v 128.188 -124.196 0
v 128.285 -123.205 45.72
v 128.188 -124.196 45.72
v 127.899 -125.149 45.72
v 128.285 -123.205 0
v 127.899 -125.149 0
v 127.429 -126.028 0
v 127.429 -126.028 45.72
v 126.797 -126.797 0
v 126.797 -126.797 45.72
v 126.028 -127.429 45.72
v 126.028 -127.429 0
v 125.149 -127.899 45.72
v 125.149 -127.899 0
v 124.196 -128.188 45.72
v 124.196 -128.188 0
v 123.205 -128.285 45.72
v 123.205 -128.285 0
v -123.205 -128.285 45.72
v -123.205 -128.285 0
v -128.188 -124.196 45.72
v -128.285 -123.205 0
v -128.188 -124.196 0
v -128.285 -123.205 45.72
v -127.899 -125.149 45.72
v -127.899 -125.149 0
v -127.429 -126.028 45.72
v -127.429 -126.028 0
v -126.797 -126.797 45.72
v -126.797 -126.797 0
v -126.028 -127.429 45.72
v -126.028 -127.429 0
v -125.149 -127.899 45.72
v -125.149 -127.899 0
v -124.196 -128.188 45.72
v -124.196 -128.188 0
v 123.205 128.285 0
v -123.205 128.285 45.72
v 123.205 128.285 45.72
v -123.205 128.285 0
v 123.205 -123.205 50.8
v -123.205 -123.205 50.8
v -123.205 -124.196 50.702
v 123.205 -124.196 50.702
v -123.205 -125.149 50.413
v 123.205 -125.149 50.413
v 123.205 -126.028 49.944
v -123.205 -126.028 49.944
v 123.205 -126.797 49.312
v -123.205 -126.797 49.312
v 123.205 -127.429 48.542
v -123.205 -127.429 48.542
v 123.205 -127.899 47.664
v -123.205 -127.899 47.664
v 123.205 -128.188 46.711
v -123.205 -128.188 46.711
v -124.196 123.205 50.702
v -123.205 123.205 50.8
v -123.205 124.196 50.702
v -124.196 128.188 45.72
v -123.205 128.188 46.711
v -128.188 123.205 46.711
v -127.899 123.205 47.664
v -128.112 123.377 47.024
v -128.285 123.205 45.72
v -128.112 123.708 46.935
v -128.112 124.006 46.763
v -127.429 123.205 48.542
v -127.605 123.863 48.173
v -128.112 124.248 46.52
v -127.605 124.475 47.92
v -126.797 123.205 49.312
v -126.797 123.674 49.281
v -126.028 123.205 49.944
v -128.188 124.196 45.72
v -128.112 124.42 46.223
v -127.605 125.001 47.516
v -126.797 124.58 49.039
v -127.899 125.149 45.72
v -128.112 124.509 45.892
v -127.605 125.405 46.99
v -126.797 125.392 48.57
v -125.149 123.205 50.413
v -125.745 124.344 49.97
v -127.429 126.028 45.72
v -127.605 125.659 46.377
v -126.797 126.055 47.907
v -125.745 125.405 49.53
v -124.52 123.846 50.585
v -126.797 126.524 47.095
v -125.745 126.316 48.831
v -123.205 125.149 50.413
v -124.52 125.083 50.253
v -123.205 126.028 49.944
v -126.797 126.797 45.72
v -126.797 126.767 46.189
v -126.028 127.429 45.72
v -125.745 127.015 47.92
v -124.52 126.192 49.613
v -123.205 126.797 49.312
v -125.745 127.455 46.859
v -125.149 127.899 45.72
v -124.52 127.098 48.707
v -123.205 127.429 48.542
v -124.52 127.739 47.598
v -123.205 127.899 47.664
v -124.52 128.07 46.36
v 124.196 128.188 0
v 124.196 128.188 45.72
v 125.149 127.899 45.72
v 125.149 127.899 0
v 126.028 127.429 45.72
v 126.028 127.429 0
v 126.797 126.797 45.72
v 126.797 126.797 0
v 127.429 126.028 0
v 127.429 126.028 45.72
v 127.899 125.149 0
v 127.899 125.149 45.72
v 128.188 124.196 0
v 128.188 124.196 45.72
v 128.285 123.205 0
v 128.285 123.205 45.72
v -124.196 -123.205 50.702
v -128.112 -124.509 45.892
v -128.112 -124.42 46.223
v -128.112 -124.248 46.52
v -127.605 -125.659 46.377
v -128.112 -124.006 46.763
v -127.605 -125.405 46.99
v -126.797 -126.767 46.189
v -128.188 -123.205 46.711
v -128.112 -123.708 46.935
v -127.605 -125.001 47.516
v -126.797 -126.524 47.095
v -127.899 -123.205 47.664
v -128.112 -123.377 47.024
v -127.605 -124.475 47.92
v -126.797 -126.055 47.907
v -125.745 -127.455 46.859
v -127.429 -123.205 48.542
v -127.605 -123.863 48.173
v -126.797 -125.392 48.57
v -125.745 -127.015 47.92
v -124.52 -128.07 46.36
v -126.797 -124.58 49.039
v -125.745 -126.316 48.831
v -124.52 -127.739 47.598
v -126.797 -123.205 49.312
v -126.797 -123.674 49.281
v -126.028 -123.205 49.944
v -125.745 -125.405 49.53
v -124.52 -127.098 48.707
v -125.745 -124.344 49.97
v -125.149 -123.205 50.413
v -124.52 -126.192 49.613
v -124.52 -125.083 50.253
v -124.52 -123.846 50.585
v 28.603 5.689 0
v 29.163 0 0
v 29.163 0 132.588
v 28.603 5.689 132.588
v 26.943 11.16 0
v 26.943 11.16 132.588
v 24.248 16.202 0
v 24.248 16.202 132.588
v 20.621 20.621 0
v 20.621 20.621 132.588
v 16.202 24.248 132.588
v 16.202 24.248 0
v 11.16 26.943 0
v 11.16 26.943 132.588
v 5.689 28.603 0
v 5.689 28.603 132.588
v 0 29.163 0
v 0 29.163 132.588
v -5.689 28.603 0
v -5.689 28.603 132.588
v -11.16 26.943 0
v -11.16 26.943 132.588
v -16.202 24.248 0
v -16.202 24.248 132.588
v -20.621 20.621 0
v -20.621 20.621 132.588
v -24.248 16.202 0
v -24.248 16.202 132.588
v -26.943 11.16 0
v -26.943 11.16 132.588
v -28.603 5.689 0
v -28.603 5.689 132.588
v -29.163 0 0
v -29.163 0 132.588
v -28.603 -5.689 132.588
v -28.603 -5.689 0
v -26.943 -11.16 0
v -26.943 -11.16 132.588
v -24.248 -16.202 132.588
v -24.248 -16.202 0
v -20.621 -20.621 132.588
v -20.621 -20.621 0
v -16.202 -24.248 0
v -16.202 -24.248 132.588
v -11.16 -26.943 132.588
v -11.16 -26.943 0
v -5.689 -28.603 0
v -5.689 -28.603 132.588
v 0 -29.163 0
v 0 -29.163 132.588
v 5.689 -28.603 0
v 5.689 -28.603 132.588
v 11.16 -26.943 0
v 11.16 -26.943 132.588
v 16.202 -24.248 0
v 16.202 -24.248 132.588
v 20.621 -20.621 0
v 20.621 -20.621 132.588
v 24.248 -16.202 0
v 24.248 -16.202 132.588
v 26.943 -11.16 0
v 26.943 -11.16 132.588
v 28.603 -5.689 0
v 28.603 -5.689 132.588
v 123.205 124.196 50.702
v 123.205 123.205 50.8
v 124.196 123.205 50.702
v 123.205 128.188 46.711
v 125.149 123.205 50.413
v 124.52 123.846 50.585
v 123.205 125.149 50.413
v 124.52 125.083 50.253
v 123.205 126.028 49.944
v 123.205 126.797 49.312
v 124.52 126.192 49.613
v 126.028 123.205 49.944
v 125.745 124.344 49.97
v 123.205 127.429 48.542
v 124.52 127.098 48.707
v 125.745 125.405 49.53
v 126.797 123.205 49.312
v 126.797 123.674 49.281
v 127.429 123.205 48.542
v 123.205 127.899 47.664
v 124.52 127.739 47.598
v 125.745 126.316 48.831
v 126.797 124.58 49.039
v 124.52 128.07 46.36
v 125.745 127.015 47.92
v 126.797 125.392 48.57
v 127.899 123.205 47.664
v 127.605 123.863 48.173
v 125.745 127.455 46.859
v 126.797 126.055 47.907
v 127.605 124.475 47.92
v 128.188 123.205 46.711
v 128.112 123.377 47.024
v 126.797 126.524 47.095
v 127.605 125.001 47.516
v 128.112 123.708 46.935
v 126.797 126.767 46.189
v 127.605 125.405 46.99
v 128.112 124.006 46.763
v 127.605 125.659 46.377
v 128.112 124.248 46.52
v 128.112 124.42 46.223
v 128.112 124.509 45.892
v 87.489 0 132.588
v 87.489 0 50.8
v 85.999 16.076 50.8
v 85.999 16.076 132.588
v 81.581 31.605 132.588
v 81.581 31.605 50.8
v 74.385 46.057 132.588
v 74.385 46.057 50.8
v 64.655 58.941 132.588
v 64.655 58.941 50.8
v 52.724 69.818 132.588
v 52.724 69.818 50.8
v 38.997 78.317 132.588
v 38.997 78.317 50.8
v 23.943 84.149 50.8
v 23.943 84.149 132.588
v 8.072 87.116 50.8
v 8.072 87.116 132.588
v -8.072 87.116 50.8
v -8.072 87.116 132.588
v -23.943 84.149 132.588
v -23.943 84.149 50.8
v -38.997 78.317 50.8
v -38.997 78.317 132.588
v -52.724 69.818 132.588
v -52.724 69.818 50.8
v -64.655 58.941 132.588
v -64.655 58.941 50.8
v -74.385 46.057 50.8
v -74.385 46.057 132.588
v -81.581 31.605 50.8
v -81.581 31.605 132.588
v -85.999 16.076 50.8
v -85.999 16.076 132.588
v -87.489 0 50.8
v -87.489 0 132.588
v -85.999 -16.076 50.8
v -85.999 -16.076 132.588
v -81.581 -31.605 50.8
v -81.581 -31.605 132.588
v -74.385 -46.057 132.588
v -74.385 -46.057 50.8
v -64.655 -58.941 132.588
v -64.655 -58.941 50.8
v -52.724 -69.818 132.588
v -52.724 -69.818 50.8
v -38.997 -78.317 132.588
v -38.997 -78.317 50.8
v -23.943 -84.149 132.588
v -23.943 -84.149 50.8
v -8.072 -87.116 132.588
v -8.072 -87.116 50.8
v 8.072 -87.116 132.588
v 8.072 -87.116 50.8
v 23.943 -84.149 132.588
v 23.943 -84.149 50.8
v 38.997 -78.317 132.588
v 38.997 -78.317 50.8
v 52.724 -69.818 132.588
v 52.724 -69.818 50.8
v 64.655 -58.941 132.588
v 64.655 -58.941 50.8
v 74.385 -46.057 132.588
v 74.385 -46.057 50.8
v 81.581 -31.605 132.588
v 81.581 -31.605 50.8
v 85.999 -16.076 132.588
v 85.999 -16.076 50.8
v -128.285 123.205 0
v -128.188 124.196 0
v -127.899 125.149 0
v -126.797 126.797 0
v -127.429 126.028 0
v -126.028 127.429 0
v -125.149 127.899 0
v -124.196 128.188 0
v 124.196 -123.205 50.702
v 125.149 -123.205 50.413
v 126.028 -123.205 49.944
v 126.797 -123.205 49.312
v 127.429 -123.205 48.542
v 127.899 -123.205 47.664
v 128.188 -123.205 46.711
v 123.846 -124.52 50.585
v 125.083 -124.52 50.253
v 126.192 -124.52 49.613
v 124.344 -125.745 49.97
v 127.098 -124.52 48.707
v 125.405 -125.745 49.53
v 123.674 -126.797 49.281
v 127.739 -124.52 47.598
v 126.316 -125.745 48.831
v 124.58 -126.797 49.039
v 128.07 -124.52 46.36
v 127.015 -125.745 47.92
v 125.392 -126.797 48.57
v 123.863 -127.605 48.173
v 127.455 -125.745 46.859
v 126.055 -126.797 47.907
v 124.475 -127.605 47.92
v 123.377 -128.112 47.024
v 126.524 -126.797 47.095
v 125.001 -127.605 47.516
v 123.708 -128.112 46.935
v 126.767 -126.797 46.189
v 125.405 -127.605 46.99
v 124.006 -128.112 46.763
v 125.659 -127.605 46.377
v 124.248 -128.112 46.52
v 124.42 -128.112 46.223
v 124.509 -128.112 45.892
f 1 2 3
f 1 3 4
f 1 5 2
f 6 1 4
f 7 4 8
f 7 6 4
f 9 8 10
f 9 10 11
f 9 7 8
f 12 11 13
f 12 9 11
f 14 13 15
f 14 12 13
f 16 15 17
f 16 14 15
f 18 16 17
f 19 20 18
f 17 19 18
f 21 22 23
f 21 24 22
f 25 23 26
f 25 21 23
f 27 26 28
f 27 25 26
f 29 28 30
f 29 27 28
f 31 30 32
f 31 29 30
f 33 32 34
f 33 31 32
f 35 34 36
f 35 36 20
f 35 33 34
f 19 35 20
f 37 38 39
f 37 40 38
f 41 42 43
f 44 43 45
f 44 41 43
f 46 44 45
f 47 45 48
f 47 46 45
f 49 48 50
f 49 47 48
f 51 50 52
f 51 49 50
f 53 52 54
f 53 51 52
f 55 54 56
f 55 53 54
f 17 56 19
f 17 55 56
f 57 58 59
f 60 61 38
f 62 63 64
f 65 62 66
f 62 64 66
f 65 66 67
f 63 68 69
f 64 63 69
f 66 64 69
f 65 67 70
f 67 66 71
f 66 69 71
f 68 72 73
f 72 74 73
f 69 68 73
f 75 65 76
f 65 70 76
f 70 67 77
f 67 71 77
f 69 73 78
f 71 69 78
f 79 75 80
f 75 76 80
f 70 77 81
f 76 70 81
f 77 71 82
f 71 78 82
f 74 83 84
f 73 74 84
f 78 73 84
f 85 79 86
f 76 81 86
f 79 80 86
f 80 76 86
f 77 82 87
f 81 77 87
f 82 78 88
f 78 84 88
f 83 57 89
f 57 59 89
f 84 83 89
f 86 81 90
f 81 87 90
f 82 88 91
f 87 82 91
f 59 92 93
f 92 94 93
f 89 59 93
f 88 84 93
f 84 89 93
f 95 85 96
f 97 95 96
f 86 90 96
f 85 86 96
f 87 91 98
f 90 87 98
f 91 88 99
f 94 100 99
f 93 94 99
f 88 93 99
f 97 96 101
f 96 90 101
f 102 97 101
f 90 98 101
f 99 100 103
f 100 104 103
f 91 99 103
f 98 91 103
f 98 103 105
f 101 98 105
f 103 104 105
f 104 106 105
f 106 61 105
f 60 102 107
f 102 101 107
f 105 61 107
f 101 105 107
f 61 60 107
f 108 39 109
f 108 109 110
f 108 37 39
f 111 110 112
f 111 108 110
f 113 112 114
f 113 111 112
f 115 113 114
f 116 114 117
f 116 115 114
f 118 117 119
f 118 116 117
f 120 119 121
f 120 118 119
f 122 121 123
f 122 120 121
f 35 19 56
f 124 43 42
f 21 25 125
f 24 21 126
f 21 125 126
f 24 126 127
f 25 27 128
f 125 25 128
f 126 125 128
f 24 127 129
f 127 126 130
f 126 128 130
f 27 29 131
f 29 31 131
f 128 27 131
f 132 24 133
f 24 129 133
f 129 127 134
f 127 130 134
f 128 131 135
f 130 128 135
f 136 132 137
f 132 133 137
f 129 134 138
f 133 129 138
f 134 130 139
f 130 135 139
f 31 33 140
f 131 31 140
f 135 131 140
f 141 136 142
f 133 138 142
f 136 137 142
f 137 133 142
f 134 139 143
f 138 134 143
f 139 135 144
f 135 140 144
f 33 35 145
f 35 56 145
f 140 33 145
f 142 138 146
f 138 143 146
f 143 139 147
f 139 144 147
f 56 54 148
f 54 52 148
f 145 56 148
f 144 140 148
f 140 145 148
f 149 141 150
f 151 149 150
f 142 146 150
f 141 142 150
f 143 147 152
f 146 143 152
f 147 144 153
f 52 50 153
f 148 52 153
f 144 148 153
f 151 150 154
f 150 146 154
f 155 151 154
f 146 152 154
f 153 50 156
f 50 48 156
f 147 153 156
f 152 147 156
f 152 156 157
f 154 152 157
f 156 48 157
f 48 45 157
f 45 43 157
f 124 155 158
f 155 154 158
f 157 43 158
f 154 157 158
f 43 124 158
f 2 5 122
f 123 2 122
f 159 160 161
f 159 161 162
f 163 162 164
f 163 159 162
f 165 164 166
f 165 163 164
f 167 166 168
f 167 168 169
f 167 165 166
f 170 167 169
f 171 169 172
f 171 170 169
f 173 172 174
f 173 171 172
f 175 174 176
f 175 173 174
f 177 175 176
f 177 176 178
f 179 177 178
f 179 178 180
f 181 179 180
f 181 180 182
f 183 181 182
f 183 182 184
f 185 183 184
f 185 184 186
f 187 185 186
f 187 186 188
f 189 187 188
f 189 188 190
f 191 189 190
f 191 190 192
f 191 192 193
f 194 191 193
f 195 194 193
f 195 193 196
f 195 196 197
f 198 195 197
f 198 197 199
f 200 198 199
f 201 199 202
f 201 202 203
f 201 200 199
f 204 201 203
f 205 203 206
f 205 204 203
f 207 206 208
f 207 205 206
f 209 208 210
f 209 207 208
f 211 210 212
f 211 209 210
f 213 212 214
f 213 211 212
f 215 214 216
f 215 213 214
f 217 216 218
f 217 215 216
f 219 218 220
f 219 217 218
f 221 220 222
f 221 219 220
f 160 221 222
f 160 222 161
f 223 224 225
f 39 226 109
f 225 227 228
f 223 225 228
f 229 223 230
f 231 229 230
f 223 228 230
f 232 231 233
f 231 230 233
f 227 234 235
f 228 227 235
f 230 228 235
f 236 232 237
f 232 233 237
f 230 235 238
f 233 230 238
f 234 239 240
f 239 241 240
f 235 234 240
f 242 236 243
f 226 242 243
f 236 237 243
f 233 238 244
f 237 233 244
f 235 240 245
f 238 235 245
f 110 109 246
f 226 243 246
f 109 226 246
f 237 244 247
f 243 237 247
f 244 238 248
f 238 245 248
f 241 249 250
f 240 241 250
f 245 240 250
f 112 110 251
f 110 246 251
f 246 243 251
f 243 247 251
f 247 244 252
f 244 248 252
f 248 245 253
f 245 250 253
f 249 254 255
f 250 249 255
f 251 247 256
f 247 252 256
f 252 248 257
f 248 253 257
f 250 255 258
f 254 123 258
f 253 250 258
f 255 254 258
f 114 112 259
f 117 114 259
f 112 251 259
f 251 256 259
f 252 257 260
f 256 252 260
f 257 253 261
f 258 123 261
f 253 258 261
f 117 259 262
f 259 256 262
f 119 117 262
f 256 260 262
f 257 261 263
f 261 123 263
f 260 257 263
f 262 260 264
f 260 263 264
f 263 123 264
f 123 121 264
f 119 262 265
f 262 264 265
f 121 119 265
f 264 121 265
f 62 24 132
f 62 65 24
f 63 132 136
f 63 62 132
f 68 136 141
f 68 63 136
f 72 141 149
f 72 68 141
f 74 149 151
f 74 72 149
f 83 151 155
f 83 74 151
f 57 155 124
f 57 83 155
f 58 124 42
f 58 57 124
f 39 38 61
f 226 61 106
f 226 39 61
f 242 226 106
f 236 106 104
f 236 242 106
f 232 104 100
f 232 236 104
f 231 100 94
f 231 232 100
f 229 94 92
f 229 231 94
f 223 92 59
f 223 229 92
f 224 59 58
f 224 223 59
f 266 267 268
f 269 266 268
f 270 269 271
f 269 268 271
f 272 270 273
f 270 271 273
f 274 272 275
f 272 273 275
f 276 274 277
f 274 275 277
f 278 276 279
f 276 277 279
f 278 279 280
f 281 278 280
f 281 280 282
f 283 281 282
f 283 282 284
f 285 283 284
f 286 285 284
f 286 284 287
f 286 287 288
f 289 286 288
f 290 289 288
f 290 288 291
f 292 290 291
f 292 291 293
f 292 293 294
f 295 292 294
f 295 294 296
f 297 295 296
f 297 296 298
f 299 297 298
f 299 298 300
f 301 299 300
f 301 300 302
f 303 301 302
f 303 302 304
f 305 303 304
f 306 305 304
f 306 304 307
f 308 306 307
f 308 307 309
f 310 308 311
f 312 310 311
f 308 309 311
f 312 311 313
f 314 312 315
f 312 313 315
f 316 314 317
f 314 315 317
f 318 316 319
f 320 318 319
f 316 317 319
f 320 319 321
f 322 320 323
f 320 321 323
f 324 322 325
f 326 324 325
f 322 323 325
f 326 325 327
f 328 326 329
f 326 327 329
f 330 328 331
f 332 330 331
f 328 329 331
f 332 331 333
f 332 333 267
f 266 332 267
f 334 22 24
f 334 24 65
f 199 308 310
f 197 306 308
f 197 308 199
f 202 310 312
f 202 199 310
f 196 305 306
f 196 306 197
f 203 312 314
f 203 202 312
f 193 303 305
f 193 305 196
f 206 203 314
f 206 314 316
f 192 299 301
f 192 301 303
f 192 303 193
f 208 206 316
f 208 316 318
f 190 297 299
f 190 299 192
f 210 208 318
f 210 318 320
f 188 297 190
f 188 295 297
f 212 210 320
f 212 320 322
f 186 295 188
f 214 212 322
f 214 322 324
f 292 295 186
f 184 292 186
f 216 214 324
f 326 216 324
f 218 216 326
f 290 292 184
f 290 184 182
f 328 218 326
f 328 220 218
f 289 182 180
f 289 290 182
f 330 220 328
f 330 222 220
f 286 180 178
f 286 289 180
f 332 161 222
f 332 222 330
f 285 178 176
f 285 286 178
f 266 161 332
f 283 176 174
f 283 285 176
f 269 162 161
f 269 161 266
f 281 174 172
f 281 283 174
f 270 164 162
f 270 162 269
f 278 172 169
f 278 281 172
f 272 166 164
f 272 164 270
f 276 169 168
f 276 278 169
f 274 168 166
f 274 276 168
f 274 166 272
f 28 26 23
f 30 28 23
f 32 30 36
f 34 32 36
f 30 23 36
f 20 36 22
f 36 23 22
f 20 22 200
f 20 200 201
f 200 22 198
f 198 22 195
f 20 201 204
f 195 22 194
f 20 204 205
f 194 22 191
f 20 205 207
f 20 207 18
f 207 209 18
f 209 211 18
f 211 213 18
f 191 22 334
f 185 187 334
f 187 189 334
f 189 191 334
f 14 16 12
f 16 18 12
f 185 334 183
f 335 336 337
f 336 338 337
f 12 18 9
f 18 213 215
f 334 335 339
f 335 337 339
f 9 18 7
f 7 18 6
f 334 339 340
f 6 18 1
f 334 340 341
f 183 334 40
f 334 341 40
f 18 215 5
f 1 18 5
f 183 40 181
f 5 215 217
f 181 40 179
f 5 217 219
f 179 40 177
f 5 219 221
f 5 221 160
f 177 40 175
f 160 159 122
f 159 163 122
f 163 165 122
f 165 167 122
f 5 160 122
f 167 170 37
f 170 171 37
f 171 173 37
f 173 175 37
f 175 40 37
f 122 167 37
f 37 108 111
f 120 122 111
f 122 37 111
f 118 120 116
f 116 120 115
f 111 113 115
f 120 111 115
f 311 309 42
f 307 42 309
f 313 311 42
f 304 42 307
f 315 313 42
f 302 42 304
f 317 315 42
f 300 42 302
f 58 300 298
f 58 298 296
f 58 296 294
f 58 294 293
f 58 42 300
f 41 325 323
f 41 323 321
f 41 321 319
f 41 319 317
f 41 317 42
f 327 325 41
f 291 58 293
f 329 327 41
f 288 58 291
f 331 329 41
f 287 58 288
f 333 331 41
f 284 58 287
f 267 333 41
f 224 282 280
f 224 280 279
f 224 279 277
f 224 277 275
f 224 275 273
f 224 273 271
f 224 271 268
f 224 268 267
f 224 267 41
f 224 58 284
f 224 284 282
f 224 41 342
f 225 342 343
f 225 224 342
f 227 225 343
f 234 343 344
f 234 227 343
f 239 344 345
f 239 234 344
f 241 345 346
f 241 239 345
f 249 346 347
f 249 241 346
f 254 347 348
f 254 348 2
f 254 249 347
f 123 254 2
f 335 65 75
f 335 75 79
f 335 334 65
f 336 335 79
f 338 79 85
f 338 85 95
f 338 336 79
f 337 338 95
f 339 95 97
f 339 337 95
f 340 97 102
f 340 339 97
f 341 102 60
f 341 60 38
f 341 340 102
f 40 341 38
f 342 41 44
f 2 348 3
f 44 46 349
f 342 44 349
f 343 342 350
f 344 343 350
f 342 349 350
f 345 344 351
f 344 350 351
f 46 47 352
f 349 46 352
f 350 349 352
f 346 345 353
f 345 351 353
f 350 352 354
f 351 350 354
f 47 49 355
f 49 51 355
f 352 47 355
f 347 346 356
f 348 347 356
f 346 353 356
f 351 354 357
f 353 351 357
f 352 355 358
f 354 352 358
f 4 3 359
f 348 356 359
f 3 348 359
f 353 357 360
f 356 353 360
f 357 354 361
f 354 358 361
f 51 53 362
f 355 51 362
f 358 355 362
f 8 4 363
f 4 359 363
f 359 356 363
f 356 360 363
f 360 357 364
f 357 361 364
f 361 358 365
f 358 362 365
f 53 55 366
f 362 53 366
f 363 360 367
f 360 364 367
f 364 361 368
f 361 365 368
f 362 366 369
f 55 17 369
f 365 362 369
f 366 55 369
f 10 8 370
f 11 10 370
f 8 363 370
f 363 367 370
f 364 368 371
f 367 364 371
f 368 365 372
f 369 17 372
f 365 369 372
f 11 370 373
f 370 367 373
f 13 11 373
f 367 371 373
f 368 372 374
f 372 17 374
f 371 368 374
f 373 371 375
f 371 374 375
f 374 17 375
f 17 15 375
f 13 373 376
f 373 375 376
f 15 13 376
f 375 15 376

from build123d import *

# Parameters (mm, degrees)
F0_W     = 256.570498
F0_H     = 256.570498
F0_R     = 29.163007
F1_DEPTH = 50.8
F2_R     = 5.08
F3_R     = 5.08
F4_R     = 5.08
F5_R     = 5.08
F6_R     = 87.489022
F6_R_2   = 29.163007
F7_DEPTH = 132.588


with BuildPart() as f1:
    # F0 (on Top) → F1 (new body)
    with BuildSketch(Plane.XY):
        Rectangle(F0_W, F0_H)
        Circle(F0_R, mode=Mode.SUBTRACT)
    extrude(amount=F1_DEPTH)

    # F2
    f2_edges = [f1.edges().sort_by_distance(p)[0] for p in [
        (0, 128.285249, 50.8),
    ]]
    fillet(f2_edges, radius=F2_R)

    # F3
    f3_edges = [f1.edges().sort_by_distance(p)[0] for p in [
        (128.285249, -2.54, 50.8),
    ]]
    fillet(f3_edges, radius=F3_R)

    # F4
    f4_edges = [f1.edges().sort_by_distance(p)[0] for p in [
        (-2.54, -128.285249, 50.8),
    ]]
    fillet(f4_edges, radius=F4_R)

    # F5
    f5_edges = [f1.edges().sort_by_distance(p)[0] for p in [
        (-128.285249, 0, 50.8),
    ]]
    fillet(f5_edges, radius=F5_R)

    # F6 (on Top) → F7 (join)
    with BuildSketch(Plane.XY):
        Circle(F6_R)
        Circle(F6_R_2, mode=Mode.SUBTRACT)
    extrude(amount=F7_DEPTH)


solid = f1.part
